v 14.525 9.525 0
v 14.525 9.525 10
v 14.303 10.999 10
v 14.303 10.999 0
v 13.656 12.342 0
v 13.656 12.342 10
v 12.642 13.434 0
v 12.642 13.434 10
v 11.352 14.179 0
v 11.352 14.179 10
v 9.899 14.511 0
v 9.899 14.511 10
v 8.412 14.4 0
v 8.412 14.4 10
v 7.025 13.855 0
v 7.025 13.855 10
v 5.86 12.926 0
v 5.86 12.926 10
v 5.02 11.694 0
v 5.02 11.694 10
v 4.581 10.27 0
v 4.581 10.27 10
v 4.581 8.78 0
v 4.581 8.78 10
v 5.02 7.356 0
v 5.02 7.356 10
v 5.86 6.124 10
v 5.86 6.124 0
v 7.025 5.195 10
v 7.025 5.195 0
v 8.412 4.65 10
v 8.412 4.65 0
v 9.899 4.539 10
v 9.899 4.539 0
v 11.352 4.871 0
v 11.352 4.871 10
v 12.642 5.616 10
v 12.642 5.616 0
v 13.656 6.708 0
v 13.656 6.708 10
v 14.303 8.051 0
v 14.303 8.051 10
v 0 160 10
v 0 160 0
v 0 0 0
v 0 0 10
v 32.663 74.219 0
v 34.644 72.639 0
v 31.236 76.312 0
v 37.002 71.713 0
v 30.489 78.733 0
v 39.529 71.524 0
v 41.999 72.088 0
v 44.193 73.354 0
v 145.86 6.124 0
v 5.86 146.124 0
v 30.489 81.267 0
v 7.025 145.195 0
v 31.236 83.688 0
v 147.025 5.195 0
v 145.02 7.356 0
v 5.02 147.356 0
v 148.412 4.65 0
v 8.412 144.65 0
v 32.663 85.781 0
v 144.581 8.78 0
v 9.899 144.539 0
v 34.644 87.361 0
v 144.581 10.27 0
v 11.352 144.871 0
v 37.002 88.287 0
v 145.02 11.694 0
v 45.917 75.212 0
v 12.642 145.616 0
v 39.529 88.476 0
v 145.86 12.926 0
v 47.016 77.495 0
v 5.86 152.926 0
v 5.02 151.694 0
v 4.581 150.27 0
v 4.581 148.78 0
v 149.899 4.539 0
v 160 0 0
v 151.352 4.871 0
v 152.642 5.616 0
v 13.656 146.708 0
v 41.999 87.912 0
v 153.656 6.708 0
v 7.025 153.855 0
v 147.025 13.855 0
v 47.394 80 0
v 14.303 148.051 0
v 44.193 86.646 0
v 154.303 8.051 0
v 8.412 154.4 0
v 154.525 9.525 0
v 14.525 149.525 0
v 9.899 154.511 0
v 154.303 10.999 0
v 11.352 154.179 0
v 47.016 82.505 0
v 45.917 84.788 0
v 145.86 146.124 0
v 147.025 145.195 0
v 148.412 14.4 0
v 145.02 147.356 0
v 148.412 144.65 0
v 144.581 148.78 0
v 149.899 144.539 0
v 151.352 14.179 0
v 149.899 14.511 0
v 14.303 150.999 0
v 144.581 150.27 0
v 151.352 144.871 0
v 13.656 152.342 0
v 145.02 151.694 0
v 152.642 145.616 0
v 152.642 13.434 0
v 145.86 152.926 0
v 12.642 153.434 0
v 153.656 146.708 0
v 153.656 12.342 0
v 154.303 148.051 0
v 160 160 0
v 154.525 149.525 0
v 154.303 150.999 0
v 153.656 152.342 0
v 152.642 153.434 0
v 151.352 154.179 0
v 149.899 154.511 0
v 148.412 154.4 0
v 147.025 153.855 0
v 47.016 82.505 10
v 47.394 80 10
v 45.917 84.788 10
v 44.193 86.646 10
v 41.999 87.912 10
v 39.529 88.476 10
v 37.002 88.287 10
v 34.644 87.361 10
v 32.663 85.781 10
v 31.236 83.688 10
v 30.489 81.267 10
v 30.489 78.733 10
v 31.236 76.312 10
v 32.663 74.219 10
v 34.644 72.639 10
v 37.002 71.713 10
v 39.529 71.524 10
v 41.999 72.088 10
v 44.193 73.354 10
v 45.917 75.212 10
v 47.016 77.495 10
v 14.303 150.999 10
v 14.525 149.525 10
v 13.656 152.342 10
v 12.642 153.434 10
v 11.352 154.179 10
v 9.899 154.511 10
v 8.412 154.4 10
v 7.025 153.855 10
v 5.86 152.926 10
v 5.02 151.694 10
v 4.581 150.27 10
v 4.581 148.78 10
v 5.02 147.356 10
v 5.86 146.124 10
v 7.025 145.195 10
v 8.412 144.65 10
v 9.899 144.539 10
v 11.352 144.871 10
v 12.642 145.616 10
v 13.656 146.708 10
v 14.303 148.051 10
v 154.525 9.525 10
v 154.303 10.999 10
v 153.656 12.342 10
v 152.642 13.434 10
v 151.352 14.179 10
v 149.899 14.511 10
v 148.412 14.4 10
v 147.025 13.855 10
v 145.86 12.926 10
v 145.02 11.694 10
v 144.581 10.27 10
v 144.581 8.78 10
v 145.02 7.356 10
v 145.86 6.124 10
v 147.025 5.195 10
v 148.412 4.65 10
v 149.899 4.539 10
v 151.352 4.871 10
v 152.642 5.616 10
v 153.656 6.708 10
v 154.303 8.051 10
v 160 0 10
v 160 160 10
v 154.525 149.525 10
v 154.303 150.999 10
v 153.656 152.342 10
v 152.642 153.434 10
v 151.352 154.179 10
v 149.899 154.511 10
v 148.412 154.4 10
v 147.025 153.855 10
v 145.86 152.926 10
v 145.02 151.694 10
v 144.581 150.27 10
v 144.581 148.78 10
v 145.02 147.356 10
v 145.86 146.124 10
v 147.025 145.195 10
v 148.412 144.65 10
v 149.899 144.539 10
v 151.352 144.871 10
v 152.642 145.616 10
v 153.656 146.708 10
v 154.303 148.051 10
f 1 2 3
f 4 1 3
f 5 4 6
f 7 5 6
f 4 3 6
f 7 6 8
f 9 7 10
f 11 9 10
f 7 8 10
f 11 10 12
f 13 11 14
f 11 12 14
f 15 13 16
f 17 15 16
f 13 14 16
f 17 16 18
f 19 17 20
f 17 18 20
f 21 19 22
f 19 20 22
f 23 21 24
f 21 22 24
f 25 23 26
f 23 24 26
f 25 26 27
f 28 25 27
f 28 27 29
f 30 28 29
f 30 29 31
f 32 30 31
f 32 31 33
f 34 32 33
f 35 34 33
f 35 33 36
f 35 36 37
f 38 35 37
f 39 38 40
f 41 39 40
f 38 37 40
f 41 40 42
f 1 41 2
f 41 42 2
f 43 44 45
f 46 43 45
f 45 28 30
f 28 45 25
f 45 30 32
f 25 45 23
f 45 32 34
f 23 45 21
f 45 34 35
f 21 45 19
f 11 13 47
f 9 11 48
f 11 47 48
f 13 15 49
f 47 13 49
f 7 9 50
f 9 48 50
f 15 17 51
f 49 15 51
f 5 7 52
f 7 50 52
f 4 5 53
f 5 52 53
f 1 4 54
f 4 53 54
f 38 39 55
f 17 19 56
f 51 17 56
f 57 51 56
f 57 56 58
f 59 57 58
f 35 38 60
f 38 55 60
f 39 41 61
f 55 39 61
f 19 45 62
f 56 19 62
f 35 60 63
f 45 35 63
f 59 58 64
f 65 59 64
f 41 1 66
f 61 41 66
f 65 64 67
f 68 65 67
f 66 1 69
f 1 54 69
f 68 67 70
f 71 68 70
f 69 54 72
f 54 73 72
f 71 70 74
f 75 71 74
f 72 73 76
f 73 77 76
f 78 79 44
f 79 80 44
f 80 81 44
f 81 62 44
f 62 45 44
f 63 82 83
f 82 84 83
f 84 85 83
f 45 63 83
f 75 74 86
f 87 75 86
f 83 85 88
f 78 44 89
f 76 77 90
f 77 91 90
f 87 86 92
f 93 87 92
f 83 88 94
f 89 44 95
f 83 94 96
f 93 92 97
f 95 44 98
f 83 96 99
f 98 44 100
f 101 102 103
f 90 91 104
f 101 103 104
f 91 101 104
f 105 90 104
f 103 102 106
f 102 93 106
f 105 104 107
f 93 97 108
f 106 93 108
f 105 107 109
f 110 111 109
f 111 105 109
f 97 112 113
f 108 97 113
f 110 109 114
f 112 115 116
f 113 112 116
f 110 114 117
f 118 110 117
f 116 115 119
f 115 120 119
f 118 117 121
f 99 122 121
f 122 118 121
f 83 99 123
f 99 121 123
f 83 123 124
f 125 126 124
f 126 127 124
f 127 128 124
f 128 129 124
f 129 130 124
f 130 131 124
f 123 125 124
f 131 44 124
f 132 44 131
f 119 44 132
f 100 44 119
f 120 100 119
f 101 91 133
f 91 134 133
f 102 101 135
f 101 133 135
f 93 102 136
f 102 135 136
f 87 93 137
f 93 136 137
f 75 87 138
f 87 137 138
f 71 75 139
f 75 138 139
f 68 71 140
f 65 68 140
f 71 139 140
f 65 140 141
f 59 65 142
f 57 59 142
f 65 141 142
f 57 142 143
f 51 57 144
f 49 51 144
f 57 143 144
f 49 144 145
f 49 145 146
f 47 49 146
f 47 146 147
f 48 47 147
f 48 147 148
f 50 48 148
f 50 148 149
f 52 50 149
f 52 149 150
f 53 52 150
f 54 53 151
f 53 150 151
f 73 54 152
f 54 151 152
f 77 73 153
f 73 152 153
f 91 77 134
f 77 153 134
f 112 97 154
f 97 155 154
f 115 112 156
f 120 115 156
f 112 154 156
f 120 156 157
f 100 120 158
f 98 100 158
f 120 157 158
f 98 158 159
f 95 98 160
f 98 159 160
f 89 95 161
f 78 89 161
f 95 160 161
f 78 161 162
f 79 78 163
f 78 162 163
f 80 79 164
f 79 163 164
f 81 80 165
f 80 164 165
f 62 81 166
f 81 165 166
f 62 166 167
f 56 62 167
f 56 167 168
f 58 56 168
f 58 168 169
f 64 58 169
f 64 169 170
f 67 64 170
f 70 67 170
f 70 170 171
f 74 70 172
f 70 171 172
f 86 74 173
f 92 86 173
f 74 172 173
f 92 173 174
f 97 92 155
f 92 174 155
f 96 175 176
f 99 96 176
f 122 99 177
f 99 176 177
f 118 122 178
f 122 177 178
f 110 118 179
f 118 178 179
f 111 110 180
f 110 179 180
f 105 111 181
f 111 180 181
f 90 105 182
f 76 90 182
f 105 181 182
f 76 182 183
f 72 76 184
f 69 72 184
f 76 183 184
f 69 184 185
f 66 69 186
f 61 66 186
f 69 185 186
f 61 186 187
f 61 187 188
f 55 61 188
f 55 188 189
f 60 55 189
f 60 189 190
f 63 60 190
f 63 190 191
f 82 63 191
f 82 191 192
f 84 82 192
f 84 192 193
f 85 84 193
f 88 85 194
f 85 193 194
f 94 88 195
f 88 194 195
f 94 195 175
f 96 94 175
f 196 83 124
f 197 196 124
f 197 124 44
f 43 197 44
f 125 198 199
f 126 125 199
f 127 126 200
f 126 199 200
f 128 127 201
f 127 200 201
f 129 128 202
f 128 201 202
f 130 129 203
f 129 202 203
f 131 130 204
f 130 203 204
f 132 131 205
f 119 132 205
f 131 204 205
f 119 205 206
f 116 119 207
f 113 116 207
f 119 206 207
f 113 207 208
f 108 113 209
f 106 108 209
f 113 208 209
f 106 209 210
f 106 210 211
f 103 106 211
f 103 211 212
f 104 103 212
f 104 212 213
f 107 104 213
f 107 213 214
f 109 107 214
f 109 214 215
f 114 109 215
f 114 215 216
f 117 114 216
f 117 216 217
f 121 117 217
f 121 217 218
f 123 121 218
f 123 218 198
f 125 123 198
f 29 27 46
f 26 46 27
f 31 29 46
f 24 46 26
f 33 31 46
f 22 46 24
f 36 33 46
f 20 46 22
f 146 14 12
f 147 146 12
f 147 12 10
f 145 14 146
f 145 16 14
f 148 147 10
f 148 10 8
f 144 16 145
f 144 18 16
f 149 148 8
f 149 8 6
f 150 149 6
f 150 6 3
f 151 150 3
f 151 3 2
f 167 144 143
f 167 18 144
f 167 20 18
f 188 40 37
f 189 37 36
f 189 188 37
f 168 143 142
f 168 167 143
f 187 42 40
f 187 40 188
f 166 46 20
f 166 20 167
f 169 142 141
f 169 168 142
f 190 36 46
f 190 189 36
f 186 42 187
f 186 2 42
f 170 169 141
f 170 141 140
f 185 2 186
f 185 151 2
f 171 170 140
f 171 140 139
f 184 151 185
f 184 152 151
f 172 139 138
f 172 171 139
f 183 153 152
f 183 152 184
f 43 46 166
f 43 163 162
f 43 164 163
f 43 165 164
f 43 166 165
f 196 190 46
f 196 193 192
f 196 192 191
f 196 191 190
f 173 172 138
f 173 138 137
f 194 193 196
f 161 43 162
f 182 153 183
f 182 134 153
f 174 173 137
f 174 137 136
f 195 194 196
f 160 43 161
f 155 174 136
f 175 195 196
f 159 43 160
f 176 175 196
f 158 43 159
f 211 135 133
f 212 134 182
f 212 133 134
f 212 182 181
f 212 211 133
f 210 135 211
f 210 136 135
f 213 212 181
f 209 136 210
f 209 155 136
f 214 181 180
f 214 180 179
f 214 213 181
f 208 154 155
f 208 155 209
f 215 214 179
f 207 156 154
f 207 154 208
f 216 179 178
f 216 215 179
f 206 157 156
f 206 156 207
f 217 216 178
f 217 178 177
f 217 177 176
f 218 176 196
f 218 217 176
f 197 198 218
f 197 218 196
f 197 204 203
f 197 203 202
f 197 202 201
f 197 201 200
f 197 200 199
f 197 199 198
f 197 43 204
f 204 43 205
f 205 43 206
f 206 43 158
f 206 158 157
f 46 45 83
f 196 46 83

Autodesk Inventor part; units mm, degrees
ref_plane "YZ Plane" through (0, 0, 0) normal (1, 0, 0) x (0, 1, 0)
ref_plane "XZ Plane" through (0, 0, 0) normal (0, 1, 0) x (-1, 0, 0)
ref_plane "XY Plane" through (0, 0, 0) normal (0, 0, 1) x (1, 0, 0)
sketch "Sketch1" plane through (0, 0, 0) normal (0, 0, 1) x (1, 0, 0)
  line L0 (0, 0) -> (160, 0)
  line L1 (160, 0) -> (160, 160)
  line L2 (160, 160) -> (0, 160)
  line L3 (0, 160) -> (0, 0)
  dimension "d0" = 160
  dimension "d1" = 160
extrude "Extrusion1" add sketch "Sketch1" along normal blind 10
sketch "Sketch2" plane through (0, 0, 10) normal (0, 0, 1) x (1, 0, 0)
  line L0 (0, 0) -> (160, 0) projected
  line L1 (0, 0) -> (10, 0)
  line L2 (10, 0) -> (10, 150)
  line L3 (10, 150) -> (150, 150)
  dimension "d4" = 10
  dimension "d5" = 150
  dimension "d6" = 140
sketch "Sketch3" plane through (0, 0, 10) normal (0, 0, 1) x (1, 0, 0)
  line L0 (150.8125, 150.8125) -> (150.8125, 10.8125)
  line L1 (150.8125, 10.8125) -> (10.8125, 10.8125)
  line L2 (10.8125, 10.8125) -> (10.8125, 80.8125)
  line L3 (10.8125, 80.8125) -> (150.8125, 80.8125)
  circle A0 centre (10.8125, 150.8125) radius 5
  circle A1 centre (150.8125, 150.8125) radius 5
  circle A2 centre (150.8125, 10.8125) radius 5
  circle A3 centre (10.8125, 10.8125) radius 5
  point P0 (0, 0)
  dimension "d7" = 140
  dimension "d8" = 140
  dimension "d9" = 70
  dimension "d10" = 140
  dimension "d11" = 10
  dimension "d12" = 10
  dimension "d14" = 10
  dimension "d15" = 10
extrude "Extrusion2" [suppressed]
sketch "Sketch4" plane through (0, 0, 10) normal (0, 0, 1) x (1, 0, 0)
  line L0 (0, 160) -> (0, 0) projected
  line L1 (0, 80) -> (30, 80)
  line L2 (30, 80) -> (33, 80)
  line L3 (33, 80) -> (36.5125, 80)
  line L4 (36.5125, 80) -> (41.275, 80)
  circle A0 centre (38.8938, 80) radius 8.5
  dimension "d19" = 30
  dimension "d36" = 3
  dimension "d40" = 17
extrude "Extrusion3" cut sketch "Sketch4" against normal through all
sketch "Sketch5" plane through (0, 0, 10) normal (0, 0, 1) x (1, 0, 0)
  line L0 (0, 160.3375) -> (9.9943, 160)
  line L1 (160, 160) -> (0, 160) projected
  line L2 (9.9943, 160) -> (159.9943, 160)
  line L3 (159.9943, 160) -> (159.9943, 0)
  line L4 (159.9943, 0) -> (147.6375, 0)
  point P0 (0, 0)
  dimension "d23" = 10
  dimension "d24" = 150
sketch "Sketch6" plane through (0, 0, 10) normal (0, 0, 1) x (1, 0, 0)
  line L0 (160, 160) -> (0, 160) projected
  line L1 (160, 160) -> (160, 150)
  line L2 (160, 0) -> (160, 160) projected
  line L3 (160, 150) -> (10, 150)
  line L4 (10, 150) -> (10, 10)
  line L5 (0, 0) -> (160, 0) projected
  dimension "d25" = 10
  dimension "d26" = 150
  dimension "d27" = 140
sketch "Sketch7" plane through (0, 0, 10) normal (0, 0, 1) x (1, 0, 0)
  line L0 (9.525, 9.525) -> (149.525, 9.525)
  line L1 (149.525, 9.525) -> (149.525, 149.525)
  circle A0 centre (9.525, 9.525) radius 5
  circle A1 centre (9.525, 149.525) radius 5
  circle A2 centre (149.525, 149.525) radius 5
  circle A3 centre (149.525, 9.525) radius 5
  point P0 (0, 0)
  dimension "d28" = 140
  dimension "d29" = 140
  dimension "d30" = 10
  dimension "d31" = 10
  dimension "d32" = 10
  dimension "d33" = 10
extrude "Extrusion4" cut sketch "Sketch7" against normal through all
properties part number "2 nd part of capping syStem"
